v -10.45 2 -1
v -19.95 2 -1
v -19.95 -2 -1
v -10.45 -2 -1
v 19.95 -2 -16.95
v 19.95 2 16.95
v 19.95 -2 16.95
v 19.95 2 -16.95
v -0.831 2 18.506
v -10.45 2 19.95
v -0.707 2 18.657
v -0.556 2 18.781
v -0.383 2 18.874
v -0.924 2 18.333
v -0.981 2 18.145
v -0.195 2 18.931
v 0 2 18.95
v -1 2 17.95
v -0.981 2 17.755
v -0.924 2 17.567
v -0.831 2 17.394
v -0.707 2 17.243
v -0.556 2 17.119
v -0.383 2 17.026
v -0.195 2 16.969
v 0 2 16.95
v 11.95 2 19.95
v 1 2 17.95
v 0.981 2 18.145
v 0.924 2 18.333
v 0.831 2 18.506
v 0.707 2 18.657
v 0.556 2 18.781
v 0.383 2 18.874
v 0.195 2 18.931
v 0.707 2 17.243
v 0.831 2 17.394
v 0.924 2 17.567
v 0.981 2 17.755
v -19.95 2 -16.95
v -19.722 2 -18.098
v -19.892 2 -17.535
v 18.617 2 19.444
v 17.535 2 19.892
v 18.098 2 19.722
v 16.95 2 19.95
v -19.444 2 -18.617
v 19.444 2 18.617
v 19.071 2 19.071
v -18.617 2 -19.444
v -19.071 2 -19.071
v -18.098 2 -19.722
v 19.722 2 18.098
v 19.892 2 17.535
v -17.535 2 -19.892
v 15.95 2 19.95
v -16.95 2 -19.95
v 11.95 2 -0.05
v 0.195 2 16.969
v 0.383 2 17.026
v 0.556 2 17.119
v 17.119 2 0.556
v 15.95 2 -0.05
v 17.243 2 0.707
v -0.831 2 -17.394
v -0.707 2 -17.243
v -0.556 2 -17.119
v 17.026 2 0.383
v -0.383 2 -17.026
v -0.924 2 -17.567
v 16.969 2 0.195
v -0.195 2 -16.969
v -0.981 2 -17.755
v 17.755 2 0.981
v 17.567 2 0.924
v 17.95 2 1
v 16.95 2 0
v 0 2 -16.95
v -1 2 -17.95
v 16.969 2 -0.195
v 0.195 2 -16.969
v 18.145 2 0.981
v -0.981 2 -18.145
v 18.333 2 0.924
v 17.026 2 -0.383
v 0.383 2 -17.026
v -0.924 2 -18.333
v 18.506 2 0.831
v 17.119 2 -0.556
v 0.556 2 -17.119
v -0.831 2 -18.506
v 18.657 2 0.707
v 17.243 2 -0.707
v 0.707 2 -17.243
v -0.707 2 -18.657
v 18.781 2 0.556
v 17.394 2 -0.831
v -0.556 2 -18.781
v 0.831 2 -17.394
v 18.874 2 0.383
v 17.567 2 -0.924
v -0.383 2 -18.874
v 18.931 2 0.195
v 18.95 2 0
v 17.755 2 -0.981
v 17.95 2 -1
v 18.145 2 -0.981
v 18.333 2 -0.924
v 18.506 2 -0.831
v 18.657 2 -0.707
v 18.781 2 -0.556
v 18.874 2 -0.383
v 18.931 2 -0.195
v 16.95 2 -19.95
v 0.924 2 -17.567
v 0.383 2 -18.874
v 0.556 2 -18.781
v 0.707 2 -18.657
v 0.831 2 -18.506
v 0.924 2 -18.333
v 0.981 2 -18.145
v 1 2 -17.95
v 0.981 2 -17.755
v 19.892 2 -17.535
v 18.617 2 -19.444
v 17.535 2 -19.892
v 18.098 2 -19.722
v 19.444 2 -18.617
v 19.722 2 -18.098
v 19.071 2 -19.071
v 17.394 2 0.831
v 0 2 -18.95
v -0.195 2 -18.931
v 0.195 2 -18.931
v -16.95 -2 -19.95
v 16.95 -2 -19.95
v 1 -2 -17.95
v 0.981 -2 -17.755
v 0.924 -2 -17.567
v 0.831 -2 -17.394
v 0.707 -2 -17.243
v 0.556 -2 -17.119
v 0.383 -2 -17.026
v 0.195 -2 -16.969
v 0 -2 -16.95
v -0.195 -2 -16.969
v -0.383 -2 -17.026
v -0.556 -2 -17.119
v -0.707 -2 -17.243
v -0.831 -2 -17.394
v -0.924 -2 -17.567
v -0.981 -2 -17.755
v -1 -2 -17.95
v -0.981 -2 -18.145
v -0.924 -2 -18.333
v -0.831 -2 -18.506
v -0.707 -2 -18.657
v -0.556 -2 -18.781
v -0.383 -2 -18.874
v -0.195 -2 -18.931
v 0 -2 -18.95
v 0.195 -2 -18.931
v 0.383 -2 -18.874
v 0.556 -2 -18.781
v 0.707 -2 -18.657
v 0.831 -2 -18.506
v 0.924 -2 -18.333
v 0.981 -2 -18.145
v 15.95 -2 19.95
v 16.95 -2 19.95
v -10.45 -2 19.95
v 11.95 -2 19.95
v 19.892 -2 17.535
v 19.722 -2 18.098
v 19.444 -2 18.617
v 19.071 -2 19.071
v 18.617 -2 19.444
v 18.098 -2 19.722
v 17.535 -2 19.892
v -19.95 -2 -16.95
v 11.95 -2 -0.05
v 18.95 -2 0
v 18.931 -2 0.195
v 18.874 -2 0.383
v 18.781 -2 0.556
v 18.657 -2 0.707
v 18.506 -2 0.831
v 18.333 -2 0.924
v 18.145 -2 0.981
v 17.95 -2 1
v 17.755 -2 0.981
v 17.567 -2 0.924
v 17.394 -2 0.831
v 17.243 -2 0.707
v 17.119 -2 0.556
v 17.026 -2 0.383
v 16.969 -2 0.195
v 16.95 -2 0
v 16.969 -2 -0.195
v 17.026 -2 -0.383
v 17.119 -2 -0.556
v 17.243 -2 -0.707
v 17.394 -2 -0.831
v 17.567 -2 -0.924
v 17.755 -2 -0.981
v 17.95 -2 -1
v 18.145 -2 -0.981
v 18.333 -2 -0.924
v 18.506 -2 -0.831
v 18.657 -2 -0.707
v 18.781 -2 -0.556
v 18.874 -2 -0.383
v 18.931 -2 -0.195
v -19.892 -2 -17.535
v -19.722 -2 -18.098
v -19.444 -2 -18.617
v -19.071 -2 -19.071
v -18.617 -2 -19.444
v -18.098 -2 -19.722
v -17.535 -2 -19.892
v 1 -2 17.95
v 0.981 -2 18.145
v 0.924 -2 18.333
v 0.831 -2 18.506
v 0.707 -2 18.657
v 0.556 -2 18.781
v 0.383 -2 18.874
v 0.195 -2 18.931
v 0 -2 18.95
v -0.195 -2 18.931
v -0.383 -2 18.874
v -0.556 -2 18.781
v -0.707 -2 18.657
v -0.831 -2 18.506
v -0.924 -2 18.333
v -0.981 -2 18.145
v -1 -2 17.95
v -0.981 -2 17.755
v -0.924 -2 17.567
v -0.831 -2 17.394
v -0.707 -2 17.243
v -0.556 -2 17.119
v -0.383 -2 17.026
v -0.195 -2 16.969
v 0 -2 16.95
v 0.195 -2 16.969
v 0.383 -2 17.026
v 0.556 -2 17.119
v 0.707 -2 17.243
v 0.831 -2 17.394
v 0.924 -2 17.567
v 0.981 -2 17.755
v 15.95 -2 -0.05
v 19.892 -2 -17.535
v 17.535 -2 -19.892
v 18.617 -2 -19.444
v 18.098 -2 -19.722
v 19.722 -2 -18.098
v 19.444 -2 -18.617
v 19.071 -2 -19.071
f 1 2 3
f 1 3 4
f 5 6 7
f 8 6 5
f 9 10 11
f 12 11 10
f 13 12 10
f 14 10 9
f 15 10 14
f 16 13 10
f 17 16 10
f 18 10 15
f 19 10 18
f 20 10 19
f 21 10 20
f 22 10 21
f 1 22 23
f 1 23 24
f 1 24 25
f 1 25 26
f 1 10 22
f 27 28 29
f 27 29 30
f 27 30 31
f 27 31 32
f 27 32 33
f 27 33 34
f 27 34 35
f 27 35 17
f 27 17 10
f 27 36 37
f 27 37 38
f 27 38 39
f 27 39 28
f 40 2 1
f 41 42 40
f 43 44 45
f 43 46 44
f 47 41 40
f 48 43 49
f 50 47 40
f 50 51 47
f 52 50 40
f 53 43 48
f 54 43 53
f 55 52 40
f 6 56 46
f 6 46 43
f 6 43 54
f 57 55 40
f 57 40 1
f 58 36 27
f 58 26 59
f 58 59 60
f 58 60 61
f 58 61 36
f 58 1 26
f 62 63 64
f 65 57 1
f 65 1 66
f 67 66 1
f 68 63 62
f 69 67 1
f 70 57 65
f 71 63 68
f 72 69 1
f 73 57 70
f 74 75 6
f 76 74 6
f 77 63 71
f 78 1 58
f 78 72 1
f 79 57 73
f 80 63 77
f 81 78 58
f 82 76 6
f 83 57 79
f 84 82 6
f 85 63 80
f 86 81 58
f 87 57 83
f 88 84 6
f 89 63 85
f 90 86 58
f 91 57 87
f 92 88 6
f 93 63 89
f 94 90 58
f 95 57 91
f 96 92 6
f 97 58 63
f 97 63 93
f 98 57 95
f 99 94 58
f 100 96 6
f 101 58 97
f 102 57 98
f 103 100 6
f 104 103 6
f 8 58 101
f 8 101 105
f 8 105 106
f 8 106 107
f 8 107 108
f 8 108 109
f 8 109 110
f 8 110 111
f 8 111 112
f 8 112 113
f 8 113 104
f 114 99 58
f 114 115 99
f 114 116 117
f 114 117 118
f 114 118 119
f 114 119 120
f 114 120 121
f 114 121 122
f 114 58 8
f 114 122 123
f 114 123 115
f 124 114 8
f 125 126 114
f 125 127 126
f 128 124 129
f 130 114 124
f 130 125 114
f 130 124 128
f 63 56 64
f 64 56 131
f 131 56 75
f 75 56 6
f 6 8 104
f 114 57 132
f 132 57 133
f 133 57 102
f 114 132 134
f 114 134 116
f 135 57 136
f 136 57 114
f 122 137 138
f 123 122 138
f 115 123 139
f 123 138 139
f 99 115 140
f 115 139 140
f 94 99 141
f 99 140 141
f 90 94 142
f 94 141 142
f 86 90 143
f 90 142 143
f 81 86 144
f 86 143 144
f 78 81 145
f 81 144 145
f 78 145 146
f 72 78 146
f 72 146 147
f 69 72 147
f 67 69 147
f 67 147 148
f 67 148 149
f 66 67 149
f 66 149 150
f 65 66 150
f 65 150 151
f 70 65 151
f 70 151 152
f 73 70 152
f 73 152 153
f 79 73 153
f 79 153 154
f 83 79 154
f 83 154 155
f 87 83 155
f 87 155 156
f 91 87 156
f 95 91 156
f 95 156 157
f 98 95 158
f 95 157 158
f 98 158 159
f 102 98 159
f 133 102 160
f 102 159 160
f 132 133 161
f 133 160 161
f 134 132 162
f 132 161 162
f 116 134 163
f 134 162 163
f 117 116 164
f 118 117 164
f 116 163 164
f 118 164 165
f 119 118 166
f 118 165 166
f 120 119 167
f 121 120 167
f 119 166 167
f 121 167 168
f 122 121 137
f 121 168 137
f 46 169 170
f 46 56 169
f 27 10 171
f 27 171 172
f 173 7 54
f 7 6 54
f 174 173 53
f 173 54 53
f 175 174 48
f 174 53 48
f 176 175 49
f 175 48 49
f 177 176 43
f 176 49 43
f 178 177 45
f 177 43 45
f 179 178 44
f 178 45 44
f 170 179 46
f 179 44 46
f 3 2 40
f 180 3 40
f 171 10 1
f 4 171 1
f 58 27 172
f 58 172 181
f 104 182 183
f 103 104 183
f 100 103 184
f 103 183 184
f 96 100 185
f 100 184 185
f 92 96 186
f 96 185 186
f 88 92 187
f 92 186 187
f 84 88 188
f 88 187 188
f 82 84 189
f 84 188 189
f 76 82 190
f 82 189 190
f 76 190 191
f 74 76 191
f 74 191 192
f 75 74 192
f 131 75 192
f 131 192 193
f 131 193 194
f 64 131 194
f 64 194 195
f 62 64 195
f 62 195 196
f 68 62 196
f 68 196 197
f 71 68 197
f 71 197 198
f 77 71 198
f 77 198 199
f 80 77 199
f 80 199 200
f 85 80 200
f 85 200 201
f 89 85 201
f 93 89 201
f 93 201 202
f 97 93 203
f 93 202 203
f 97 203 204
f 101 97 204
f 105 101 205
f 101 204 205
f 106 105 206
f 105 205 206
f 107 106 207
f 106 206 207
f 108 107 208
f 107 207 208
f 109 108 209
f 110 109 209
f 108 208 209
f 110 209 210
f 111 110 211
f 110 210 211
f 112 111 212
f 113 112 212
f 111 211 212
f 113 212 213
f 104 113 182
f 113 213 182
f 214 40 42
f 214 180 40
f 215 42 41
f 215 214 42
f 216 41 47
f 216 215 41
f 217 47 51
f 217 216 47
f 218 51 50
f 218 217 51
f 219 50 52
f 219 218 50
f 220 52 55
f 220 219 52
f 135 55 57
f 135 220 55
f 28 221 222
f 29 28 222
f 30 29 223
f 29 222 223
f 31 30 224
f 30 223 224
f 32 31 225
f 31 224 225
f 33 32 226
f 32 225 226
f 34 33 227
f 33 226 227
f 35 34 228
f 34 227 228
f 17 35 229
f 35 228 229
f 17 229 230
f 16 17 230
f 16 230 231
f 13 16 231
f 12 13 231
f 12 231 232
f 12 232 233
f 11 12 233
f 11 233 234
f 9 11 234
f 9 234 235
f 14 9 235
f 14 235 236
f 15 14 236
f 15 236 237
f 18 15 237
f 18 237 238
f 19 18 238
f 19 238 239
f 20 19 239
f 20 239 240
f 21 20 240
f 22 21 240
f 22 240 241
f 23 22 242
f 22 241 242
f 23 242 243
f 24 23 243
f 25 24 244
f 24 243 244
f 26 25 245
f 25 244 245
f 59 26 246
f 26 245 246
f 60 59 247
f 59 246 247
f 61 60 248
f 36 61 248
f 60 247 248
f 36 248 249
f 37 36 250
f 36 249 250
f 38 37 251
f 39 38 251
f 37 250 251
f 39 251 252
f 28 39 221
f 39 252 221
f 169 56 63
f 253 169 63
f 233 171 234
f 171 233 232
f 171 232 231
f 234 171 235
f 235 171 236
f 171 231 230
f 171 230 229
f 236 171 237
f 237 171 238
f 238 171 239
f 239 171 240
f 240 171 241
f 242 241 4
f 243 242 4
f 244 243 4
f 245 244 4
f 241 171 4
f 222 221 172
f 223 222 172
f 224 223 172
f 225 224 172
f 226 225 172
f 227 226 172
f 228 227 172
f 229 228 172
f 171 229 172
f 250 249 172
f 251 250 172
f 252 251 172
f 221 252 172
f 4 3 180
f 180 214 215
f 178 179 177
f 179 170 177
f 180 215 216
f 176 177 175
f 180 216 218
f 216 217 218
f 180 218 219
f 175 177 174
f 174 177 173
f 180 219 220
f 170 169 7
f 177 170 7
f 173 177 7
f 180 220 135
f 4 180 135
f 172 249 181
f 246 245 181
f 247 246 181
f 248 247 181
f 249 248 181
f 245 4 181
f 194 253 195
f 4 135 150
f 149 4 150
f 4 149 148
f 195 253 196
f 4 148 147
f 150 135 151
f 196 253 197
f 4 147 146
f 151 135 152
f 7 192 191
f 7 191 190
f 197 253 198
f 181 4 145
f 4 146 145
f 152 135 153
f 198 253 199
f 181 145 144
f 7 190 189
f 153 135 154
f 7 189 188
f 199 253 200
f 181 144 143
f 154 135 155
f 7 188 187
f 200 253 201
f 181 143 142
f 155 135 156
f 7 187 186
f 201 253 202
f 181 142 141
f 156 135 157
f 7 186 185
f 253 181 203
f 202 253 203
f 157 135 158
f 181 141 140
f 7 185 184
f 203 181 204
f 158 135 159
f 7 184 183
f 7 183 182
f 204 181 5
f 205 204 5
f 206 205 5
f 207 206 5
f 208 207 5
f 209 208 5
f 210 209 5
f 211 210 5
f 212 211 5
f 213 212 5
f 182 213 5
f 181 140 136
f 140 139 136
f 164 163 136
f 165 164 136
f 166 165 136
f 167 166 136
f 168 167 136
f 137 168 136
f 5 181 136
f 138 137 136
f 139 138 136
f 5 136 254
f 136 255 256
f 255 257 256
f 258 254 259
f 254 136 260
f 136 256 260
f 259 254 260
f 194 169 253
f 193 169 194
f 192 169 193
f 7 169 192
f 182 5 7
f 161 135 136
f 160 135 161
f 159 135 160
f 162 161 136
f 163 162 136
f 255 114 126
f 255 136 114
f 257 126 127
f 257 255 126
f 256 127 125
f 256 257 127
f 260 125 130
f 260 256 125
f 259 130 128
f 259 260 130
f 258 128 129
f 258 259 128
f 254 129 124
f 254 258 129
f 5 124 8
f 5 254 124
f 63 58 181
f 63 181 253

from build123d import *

# Parameters (mm, degrees)
CROQUIS1_W                 = 39.9
CROQUIS1_H                 = 39.9
SALIENTE_EXTRUIR1_DEPTH    = 2
CROQUIS7_W                 = 4
CROQUIS7_H                 = 20
CORTAR_EXTRUIR3_DEPTH      = 3
CORTAR_EXTRUIR3_DEPTH_BACK = 3
CROQUIS9_R                 = 1
CORTAR_EXTRUIR4_DEPTH      = 1
CORTAR_EXTRUIR4_DEPTH_BACK = 5
REDONDEO8_R                = 3
CROQUIS10_W                = 9.5
CROQUIS10_H                = 20.95
CORTAR_EXTRUIR5_DEPTH      = 1
CORTAR_EXTRUIR5_DEPTH_BACK = 5


with BuildPart() as part:
    # Croquis1 → Saliente-Extruir1 (new body, symmetric)
    with BuildSketch(Plane(origin=(0, 0, 0), x_dir=(1, 0, 0), z_dir=(0, 1, 0))):
        Rectangle(CROQUIS1_W, CROQUIS1_H)
    extrude(amount=SALIENTE_EXTRUIR1_DEPTH, both=True)

    # Croquis7 → Cortar-Extruir3 (cut, two sides)
    with BuildSketch(Plane(origin=(0, 0, 0), x_dir=(1, 0, 0), z_dir=(0, 1, 0))) as cortar_extruir3_sk:
        with Locations((13.95, -9.95)):
            Rectangle(CROQUIS7_W, CROQUIS7_H)
        with Locations((-13.95, -9.95)):
            Rectangle(CROQUIS7_W, CROQUIS7_H)
    extrude(amount=CORTAR_EXTRUIR3_DEPTH, mode=Mode.SUBTRACT)
    extrude(cortar_extruir3_sk.sketch, amount=-CORTAR_EXTRUIR3_DEPTH_BACK, mode=Mode.SUBTRACT)

    # Croquis9 → Cortar-Extruir4 (cut, two sides)
    with BuildSketch(Plane.XZ.offset(2)) as cortar_extruir4_sk:
        with Locations((0, 17.95)):
            Circle(CROQUIS9_R)
        with Locations((-17.95, 0)):
            Circle(CROQUIS9_R)
        with Locations((0, -17.95)):
            Circle(CROQUIS9_R)
        with Locations((17.95, 0)):
            Circle(CROQUIS9_R)
    extrude(amount=CORTAR_EXTRUIR4_DEPTH, mode=Mode.SUBTRACT)
    extrude(cortar_extruir4_sk.sketch, amount=-CORTAR_EXTRUIR4_DEPTH_BACK, mode=Mode.SUBTRACT)

    # Redondeo8
    redondeo8_edges = [part.edges().sort_by_distance(p)[0] for p in [
        (19.95, 0, 19.95),
        (-19.95, 0, 19.95),
        (-19.95, 0, -19.95),
        (19.95, 0, -19.95),
    ]]
    fillet(redondeo8_edges, radius=REDONDEO8_R)

    # Croquis10 → Cortar-Extruir5 (cut, two sides)
    with BuildSketch(Plane(origin=(0, 2, 0), x_dir=(1, 0, 0), z_dir=(0, 1, 0))) as cortar_extruir5_sk:
        with Locations((-15.2, -9.475)):
            Rectangle(CROQUIS10_W, CROQUIS10_H)
    extrude(amount=CORTAR_EXTRUIR5_DEPTH, mode=Mode.SUBTRACT)
    extrude(cortar_extruir5_sk.sketch, amount=-CORTAR_EXTRUIR5_DEPTH_BACK, mode=Mode.SUBTRACT)


solid = part.part
